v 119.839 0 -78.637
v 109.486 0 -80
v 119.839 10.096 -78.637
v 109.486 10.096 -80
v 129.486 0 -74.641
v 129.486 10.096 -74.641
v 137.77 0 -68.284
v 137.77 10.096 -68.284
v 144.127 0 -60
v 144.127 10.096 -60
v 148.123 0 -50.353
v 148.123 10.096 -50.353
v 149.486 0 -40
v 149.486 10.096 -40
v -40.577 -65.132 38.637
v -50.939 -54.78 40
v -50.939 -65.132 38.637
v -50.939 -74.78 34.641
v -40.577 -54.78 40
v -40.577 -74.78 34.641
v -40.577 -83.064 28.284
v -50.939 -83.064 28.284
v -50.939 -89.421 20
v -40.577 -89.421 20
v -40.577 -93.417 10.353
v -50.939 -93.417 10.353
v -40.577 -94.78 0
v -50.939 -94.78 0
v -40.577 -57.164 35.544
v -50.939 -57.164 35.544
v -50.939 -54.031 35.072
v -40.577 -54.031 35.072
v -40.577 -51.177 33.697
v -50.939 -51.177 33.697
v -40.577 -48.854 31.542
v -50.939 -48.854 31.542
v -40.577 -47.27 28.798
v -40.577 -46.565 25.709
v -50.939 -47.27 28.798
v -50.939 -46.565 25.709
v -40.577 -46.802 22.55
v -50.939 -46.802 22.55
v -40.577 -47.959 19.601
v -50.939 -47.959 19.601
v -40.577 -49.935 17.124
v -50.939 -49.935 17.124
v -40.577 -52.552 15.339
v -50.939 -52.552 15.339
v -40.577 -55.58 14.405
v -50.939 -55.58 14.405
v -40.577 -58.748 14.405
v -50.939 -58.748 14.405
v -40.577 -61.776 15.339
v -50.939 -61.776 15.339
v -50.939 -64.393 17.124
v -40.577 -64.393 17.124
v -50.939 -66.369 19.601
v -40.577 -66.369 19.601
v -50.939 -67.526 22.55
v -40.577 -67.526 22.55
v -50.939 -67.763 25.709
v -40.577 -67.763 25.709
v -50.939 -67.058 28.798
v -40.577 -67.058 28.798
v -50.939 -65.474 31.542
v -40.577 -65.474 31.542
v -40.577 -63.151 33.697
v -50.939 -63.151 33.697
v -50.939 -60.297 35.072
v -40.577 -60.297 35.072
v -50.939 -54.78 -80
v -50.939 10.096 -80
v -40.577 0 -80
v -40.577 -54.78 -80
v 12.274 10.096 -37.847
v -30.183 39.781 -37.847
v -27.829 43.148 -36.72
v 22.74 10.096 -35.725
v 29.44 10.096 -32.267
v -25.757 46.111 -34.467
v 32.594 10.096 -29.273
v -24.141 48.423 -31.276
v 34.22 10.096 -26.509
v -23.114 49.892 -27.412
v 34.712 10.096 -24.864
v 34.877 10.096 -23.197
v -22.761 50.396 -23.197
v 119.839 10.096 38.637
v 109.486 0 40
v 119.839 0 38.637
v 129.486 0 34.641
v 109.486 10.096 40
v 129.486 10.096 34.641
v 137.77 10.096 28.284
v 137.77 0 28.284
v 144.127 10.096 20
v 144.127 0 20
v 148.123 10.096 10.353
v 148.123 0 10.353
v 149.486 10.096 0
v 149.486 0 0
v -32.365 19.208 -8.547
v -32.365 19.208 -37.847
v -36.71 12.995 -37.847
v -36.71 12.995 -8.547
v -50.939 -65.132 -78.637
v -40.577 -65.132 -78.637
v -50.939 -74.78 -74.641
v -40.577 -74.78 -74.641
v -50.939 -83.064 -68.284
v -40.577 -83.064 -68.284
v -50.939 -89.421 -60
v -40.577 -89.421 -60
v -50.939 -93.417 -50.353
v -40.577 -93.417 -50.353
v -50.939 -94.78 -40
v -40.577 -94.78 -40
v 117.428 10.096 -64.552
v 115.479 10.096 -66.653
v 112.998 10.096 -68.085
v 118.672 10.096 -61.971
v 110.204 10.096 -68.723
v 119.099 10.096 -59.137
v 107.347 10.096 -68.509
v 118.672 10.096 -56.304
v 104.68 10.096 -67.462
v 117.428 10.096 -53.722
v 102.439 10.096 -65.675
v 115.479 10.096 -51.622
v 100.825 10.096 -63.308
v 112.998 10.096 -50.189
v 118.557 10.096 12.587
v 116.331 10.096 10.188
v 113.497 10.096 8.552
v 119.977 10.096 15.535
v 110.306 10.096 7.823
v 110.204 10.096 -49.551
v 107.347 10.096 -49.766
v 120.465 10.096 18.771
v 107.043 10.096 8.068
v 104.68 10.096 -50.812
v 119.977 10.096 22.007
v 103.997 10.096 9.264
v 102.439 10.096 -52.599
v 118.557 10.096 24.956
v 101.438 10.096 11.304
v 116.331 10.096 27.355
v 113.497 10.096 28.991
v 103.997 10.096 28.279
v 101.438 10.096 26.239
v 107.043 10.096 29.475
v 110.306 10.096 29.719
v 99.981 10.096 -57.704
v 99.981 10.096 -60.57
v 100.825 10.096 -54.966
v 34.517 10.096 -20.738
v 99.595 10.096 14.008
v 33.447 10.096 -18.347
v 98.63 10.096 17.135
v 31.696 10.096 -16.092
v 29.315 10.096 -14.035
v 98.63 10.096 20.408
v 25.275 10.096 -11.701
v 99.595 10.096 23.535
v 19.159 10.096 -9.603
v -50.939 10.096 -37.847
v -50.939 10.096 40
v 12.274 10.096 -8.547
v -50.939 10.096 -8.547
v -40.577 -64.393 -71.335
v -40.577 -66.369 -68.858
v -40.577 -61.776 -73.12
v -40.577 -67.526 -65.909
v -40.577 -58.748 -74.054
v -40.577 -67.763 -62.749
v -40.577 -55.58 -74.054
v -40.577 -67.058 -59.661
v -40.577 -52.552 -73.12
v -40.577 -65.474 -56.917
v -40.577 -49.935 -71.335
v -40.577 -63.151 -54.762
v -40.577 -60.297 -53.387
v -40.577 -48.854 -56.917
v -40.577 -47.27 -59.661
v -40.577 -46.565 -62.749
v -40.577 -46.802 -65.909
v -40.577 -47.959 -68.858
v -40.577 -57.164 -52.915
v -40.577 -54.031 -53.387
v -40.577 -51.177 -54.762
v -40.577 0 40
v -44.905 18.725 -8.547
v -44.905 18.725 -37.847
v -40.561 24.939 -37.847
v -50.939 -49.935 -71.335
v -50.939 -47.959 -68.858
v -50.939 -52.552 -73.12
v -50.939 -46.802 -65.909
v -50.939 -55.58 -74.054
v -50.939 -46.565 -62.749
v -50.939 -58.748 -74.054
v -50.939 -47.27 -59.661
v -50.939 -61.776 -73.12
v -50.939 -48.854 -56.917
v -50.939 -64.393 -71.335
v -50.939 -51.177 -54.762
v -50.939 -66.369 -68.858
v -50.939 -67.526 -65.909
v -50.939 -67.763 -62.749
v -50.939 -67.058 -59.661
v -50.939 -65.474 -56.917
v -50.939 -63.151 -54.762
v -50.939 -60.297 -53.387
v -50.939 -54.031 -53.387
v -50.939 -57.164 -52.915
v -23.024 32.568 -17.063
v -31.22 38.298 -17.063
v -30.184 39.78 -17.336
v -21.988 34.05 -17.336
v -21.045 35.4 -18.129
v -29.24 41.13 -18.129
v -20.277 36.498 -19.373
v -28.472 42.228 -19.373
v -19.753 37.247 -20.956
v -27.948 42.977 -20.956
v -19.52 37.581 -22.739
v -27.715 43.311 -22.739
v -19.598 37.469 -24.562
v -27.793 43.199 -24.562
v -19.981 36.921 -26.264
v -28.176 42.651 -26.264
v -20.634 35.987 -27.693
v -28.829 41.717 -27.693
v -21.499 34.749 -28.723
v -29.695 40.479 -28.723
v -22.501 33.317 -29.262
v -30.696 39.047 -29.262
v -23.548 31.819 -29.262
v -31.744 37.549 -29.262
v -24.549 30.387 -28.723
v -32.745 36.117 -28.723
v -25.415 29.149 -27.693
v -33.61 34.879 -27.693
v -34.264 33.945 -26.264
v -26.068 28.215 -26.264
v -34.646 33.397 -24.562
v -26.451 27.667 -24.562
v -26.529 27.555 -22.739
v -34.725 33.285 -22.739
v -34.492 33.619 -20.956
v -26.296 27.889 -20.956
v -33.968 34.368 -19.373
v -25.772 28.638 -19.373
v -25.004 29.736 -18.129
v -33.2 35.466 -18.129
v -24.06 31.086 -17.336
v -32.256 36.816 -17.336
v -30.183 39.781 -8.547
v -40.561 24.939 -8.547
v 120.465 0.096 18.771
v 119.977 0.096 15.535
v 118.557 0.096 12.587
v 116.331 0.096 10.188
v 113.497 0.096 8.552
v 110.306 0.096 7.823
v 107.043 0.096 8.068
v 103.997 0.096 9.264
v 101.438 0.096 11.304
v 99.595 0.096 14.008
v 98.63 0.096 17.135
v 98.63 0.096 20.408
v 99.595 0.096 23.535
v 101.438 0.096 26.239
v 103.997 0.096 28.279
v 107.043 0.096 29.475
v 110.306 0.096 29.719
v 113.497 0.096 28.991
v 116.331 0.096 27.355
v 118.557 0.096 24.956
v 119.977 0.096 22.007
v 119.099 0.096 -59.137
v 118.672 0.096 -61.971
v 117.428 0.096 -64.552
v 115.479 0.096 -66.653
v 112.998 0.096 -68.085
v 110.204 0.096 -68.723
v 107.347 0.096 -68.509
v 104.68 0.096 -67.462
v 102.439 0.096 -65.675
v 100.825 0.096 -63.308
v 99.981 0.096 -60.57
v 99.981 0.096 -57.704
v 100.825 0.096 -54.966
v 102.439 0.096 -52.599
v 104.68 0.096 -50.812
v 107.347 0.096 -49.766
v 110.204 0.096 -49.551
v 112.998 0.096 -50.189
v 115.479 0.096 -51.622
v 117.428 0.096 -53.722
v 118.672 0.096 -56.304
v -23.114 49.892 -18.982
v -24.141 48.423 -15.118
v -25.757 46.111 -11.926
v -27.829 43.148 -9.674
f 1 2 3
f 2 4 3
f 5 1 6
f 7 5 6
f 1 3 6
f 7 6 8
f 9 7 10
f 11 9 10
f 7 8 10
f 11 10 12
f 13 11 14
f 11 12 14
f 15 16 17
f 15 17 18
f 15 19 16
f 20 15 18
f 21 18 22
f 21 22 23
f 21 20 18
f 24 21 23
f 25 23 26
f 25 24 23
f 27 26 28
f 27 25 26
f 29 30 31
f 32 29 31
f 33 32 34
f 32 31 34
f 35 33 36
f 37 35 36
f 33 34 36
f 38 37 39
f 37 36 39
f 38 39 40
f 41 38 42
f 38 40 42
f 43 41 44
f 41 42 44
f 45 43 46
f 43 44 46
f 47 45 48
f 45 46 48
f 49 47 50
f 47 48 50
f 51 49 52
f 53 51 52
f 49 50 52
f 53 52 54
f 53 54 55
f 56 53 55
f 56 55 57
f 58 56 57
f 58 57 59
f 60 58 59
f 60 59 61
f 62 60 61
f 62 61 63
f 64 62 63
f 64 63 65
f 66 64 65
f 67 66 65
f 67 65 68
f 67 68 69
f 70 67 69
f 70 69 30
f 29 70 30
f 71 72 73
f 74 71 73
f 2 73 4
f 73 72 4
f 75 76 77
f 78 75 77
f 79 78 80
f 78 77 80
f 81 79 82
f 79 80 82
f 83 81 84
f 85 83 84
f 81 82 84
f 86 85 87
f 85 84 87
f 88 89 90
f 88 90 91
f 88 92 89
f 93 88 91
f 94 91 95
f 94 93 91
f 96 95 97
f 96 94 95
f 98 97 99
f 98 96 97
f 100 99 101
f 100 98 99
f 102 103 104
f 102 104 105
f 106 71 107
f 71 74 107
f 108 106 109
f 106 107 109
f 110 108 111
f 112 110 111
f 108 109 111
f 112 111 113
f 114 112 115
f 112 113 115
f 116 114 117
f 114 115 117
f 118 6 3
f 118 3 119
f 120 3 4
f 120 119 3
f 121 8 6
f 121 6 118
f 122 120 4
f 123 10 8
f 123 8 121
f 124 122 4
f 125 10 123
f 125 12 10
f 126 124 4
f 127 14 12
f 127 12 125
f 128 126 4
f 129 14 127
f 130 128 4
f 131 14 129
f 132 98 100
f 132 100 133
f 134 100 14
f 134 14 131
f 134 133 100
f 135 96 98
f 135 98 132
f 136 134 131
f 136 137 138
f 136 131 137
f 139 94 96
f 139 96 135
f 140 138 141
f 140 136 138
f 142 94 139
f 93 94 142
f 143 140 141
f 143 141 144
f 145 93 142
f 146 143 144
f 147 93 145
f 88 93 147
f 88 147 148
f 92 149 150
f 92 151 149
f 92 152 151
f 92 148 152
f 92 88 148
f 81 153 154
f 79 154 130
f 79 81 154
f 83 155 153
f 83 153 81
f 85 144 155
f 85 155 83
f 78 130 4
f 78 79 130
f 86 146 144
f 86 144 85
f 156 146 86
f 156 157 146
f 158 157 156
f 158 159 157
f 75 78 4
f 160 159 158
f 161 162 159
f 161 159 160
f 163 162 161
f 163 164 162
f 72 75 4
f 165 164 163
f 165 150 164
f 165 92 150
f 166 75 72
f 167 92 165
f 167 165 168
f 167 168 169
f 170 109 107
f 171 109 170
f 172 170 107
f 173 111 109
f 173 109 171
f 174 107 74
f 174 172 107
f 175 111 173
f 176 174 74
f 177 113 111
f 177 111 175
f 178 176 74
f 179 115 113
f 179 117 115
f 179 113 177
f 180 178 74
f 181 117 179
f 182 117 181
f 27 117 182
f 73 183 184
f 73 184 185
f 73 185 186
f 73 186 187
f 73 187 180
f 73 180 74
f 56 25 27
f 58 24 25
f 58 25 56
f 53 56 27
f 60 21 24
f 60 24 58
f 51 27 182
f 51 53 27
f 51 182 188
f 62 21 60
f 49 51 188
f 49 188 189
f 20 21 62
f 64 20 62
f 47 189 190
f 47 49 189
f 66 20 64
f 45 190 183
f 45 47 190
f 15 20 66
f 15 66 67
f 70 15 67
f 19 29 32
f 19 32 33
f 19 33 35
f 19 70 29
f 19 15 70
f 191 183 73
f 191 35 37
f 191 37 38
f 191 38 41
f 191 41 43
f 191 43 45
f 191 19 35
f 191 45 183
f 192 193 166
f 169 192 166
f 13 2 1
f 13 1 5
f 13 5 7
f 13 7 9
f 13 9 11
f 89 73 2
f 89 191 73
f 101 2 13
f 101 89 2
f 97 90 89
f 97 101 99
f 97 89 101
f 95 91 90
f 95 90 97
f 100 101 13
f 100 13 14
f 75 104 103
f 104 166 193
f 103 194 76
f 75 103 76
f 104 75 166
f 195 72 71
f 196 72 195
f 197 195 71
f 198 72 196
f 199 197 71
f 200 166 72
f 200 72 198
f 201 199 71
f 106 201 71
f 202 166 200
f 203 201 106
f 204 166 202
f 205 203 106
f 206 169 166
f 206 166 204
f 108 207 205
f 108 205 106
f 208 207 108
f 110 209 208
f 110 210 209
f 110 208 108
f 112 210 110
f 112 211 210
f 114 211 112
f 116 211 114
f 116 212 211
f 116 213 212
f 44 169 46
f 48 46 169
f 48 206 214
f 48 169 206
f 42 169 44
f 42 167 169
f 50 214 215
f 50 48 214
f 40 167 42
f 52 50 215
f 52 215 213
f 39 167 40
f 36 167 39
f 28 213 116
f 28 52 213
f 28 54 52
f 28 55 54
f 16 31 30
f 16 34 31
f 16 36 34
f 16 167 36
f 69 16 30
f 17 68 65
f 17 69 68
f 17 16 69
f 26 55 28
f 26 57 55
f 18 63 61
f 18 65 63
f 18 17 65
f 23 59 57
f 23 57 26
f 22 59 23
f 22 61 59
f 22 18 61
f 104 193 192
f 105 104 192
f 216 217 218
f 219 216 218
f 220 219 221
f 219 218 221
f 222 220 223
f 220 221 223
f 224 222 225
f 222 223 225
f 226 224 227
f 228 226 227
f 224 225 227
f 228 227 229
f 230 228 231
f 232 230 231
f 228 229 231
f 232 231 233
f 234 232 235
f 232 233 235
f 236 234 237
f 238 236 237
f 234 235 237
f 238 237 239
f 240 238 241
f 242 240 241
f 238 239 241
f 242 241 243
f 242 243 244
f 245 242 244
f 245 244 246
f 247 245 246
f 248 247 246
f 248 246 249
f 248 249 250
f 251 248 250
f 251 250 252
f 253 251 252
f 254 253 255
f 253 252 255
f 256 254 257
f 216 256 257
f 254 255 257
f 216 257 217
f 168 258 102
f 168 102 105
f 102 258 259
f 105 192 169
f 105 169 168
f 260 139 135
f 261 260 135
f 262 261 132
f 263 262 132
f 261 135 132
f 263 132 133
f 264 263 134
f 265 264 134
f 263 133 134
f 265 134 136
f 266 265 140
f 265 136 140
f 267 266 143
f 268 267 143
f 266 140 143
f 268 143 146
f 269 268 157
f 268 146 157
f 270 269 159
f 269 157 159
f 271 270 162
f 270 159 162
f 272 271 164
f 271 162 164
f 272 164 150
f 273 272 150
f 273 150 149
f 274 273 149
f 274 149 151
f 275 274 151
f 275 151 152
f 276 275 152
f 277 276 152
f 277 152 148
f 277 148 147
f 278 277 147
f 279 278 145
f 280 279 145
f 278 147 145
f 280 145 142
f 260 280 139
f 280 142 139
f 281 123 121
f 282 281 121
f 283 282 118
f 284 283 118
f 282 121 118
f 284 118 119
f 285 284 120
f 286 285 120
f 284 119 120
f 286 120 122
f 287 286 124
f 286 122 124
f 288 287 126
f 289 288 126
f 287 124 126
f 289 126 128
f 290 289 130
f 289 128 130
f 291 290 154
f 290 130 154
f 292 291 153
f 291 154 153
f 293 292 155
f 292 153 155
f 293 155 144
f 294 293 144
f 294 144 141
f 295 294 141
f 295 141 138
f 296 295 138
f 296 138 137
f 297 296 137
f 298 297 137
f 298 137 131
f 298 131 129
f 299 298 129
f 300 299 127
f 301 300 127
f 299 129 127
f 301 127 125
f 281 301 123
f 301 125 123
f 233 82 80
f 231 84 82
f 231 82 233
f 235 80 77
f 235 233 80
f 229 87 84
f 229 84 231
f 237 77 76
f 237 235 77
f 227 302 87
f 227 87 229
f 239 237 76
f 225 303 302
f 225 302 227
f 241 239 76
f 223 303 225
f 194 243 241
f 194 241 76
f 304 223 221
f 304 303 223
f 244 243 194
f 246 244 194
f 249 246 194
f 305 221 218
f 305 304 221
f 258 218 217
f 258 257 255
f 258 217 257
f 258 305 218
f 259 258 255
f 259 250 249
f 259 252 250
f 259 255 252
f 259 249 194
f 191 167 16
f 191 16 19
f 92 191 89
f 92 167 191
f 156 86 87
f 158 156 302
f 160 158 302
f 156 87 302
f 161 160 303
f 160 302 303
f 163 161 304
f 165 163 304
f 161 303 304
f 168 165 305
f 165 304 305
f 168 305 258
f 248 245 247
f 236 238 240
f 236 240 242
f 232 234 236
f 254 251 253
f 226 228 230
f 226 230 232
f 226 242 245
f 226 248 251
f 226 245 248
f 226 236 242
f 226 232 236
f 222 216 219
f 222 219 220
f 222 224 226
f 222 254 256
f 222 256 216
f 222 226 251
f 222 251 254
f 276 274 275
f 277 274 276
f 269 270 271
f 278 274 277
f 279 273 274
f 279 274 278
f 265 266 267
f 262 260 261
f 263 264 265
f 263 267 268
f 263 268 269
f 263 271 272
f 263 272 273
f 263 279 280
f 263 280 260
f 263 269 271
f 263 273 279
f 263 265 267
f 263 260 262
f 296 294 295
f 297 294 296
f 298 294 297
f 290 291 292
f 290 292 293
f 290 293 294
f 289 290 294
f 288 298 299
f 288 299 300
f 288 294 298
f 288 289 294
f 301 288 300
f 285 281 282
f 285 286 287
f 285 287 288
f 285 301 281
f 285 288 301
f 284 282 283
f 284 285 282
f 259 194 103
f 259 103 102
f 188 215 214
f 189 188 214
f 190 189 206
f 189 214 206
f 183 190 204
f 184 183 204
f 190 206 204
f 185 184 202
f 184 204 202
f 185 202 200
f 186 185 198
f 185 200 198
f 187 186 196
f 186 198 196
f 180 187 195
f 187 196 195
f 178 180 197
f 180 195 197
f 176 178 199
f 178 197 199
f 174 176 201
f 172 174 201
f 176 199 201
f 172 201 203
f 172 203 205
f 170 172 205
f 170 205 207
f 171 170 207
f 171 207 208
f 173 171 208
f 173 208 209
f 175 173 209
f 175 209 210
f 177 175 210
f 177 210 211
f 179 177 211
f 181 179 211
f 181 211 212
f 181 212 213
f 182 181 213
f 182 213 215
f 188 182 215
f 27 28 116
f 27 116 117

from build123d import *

# Parameters (mm, degrees)
BOSS_EXTRUDE1_DEPTH      = 50
CUT_EXTRUDE1_DEPTH       = 100
BOSS_EXTRUDE2_DEPTH      = 40
BOSS_EXTRUDE2_DEPTH_BACK = 80
SKETCH5_R                = 6.133635391
SKETCH5_W                = 29.300165504
SKETCH5_H                = 7.581524949
CUT_EXTRUDE2_DEPTH       = 10
FILLET1_R                = 40
FILLET2_R                = 40
SKETCH6_R                = 9.612627596
SKETCH6_R_2              = 10.978592339
CUT_EXTRUDE3_DEPTH       = 10
SKETCH7_R                = 10.62877533
CUT_EXTRUDE4_DEPTH       = 20


with BuildPart() as part:
    # Sketch1 → Boss-Extrude1 (new body)
    with BuildSketch(Plane.XY):
        Polygon((34.876820554, 10.095921739), (-11.47263834, 66.541302373), (-50.93851423, 10.095921739), align=None)
    extrude(amount=-BOSS_EXTRUDE1_DEPTH)

    # Sketch2 → Cut-Extrude1 (cut)
    with BuildSketch(Plane(origin=(-38.95420386, 27.236272618, 0), x_dir=(0, 0, 1), z_dir=(-0.819544824, 0.57301508, 0))):
        Polygon((-37.846995644, 47.959585147), (-37.846995644, 28.259004522), (-23.196912892, 28.259004522), (-8.54683014, 28.259004522), (0, 28.259004522), (0, 47.959585147), align=None)
        Polygon((-8.54683014, 15.307343506), (-8.54683014, -20.914476405), (0, -20.914476405), (0, 28.259004522), (-8.54683014, 28.259004522), align=None)
        with BuildLine():
            ThreePointArc((-23.196912892, 28.259004522), (-13.419765459, 24.556838072), (-8.54683014, 15.307343506))
            Line((-8.54683014, 15.307343506), (-8.54683014, 28.259004522))
            Line((-8.54683014, 28.259004522), (-23.196912892, 28.259004522))
        make_face()
        with BuildLine():
            Line((-37.846995644, 28.259004522), (-37.846995644, 15.307343506))
            ThreePointArc((-37.846995644, 15.307343506), (-32.974060325, 24.556838072), (-23.196912892, 28.259004522))
            Line((-23.196912892, 28.259004522), (-37.846995644, 28.259004522))
        make_face()
        Polygon((-50, -20.914476405), (-37.846995644, -20.914476405), (-37.846995644, 15.307343506), (-37.846995644, 28.259004522), (-37.846995644, 47.959585147), (-50, 47.959585147), align=None)
    extrude(amount=-CUT_EXTRUDE1_DEPTH, mode=Mode.SUBTRACT)

    # Sketch3 → Boss-Extrude2 (add, two sides)
    with BuildSketch(Plane.XY) as boss_extrude2_sk:
        Polygon((149.486050835, 10.095921739), (-50.93851423, 10.095921739), (-50.93851423, -94.77972655), (-40.577313053, -94.77972655), (-40.577313053, 0), (149.486050835, 0), align=None)
    extrude(amount=BOSS_EXTRUDE2_DEPTH)
    extrude(boss_extrude2_sk.sketch, amount=-BOSS_EXTRUDE2_DEPTH_BACK)

    # Sketch5 → Cut-Extrude2 (cut)
    with BuildSketch(Plane(origin=(-38.95420386, 27.236272618, 0), x_dir=(0, 0, 1), z_dir=(-0.819544824, 0.57301508, 0))):
        with Locations((-23.196912892, 13.497560131)):
            Circle(SKETCH5_R)
        with Locations((-23.196912892, -6.594328923)):
            Rectangle(SKETCH5_W, SKETCH5_H)
    extrude(amount=-CUT_EXTRUDE2_DEPTH, mode=Mode.SUBTRACT)

    # Fillet1
    fillet1_edges = [part.edges().sort_by_distance(p)[0] for p in [
        (-45.757913642, -94.77972655, -80),
        (-45.757913642, -94.77972655, 40),
    ]]
    fillet(fillet1_edges, radius=FILLET1_R)

    # Fillet2
    fillet2_edges = [part.edges().sort_by_distance(p)[0] for p in [
        (149.486050835, 5.04796087, -80),
        (149.486050835, 5.04796087, 40),
    ]]
    fillet(fillet2_edges, radius=FILLET2_R)

    # Sketch6 → Cut-Extrude3 (cut)
    with BuildSketch(Plane(origin=(0, 10.095921739, 0), x_dir=(1, 0, 0), z_dir=(0, 1, 0))):
        with Locations((109.486050835, 59.137142256)):
            Circle(SKETCH6_R)
        with Locations((109.486050835, -18.771374572)):
            Circle(SKETCH6_R_2)
    extrude(amount=-CUT_EXTRUDE3_DEPTH, mode=Mode.SUBTRACT)

    # Sketch7 → Cut-Extrude4 (cut)
    with BuildSketch(Plane.ZY.offset(50.93851423)):
        with Locations((-63.54369248, -57.164065998)):
            Circle(SKETCH7_R)
        with Locations((24.915147361, -57.164065998)):
            Circle(SKETCH7_R)
    extrude(amount=-CUT_EXTRUDE4_DEPTH, mode=Mode.SUBTRACT)


solid = part.part
